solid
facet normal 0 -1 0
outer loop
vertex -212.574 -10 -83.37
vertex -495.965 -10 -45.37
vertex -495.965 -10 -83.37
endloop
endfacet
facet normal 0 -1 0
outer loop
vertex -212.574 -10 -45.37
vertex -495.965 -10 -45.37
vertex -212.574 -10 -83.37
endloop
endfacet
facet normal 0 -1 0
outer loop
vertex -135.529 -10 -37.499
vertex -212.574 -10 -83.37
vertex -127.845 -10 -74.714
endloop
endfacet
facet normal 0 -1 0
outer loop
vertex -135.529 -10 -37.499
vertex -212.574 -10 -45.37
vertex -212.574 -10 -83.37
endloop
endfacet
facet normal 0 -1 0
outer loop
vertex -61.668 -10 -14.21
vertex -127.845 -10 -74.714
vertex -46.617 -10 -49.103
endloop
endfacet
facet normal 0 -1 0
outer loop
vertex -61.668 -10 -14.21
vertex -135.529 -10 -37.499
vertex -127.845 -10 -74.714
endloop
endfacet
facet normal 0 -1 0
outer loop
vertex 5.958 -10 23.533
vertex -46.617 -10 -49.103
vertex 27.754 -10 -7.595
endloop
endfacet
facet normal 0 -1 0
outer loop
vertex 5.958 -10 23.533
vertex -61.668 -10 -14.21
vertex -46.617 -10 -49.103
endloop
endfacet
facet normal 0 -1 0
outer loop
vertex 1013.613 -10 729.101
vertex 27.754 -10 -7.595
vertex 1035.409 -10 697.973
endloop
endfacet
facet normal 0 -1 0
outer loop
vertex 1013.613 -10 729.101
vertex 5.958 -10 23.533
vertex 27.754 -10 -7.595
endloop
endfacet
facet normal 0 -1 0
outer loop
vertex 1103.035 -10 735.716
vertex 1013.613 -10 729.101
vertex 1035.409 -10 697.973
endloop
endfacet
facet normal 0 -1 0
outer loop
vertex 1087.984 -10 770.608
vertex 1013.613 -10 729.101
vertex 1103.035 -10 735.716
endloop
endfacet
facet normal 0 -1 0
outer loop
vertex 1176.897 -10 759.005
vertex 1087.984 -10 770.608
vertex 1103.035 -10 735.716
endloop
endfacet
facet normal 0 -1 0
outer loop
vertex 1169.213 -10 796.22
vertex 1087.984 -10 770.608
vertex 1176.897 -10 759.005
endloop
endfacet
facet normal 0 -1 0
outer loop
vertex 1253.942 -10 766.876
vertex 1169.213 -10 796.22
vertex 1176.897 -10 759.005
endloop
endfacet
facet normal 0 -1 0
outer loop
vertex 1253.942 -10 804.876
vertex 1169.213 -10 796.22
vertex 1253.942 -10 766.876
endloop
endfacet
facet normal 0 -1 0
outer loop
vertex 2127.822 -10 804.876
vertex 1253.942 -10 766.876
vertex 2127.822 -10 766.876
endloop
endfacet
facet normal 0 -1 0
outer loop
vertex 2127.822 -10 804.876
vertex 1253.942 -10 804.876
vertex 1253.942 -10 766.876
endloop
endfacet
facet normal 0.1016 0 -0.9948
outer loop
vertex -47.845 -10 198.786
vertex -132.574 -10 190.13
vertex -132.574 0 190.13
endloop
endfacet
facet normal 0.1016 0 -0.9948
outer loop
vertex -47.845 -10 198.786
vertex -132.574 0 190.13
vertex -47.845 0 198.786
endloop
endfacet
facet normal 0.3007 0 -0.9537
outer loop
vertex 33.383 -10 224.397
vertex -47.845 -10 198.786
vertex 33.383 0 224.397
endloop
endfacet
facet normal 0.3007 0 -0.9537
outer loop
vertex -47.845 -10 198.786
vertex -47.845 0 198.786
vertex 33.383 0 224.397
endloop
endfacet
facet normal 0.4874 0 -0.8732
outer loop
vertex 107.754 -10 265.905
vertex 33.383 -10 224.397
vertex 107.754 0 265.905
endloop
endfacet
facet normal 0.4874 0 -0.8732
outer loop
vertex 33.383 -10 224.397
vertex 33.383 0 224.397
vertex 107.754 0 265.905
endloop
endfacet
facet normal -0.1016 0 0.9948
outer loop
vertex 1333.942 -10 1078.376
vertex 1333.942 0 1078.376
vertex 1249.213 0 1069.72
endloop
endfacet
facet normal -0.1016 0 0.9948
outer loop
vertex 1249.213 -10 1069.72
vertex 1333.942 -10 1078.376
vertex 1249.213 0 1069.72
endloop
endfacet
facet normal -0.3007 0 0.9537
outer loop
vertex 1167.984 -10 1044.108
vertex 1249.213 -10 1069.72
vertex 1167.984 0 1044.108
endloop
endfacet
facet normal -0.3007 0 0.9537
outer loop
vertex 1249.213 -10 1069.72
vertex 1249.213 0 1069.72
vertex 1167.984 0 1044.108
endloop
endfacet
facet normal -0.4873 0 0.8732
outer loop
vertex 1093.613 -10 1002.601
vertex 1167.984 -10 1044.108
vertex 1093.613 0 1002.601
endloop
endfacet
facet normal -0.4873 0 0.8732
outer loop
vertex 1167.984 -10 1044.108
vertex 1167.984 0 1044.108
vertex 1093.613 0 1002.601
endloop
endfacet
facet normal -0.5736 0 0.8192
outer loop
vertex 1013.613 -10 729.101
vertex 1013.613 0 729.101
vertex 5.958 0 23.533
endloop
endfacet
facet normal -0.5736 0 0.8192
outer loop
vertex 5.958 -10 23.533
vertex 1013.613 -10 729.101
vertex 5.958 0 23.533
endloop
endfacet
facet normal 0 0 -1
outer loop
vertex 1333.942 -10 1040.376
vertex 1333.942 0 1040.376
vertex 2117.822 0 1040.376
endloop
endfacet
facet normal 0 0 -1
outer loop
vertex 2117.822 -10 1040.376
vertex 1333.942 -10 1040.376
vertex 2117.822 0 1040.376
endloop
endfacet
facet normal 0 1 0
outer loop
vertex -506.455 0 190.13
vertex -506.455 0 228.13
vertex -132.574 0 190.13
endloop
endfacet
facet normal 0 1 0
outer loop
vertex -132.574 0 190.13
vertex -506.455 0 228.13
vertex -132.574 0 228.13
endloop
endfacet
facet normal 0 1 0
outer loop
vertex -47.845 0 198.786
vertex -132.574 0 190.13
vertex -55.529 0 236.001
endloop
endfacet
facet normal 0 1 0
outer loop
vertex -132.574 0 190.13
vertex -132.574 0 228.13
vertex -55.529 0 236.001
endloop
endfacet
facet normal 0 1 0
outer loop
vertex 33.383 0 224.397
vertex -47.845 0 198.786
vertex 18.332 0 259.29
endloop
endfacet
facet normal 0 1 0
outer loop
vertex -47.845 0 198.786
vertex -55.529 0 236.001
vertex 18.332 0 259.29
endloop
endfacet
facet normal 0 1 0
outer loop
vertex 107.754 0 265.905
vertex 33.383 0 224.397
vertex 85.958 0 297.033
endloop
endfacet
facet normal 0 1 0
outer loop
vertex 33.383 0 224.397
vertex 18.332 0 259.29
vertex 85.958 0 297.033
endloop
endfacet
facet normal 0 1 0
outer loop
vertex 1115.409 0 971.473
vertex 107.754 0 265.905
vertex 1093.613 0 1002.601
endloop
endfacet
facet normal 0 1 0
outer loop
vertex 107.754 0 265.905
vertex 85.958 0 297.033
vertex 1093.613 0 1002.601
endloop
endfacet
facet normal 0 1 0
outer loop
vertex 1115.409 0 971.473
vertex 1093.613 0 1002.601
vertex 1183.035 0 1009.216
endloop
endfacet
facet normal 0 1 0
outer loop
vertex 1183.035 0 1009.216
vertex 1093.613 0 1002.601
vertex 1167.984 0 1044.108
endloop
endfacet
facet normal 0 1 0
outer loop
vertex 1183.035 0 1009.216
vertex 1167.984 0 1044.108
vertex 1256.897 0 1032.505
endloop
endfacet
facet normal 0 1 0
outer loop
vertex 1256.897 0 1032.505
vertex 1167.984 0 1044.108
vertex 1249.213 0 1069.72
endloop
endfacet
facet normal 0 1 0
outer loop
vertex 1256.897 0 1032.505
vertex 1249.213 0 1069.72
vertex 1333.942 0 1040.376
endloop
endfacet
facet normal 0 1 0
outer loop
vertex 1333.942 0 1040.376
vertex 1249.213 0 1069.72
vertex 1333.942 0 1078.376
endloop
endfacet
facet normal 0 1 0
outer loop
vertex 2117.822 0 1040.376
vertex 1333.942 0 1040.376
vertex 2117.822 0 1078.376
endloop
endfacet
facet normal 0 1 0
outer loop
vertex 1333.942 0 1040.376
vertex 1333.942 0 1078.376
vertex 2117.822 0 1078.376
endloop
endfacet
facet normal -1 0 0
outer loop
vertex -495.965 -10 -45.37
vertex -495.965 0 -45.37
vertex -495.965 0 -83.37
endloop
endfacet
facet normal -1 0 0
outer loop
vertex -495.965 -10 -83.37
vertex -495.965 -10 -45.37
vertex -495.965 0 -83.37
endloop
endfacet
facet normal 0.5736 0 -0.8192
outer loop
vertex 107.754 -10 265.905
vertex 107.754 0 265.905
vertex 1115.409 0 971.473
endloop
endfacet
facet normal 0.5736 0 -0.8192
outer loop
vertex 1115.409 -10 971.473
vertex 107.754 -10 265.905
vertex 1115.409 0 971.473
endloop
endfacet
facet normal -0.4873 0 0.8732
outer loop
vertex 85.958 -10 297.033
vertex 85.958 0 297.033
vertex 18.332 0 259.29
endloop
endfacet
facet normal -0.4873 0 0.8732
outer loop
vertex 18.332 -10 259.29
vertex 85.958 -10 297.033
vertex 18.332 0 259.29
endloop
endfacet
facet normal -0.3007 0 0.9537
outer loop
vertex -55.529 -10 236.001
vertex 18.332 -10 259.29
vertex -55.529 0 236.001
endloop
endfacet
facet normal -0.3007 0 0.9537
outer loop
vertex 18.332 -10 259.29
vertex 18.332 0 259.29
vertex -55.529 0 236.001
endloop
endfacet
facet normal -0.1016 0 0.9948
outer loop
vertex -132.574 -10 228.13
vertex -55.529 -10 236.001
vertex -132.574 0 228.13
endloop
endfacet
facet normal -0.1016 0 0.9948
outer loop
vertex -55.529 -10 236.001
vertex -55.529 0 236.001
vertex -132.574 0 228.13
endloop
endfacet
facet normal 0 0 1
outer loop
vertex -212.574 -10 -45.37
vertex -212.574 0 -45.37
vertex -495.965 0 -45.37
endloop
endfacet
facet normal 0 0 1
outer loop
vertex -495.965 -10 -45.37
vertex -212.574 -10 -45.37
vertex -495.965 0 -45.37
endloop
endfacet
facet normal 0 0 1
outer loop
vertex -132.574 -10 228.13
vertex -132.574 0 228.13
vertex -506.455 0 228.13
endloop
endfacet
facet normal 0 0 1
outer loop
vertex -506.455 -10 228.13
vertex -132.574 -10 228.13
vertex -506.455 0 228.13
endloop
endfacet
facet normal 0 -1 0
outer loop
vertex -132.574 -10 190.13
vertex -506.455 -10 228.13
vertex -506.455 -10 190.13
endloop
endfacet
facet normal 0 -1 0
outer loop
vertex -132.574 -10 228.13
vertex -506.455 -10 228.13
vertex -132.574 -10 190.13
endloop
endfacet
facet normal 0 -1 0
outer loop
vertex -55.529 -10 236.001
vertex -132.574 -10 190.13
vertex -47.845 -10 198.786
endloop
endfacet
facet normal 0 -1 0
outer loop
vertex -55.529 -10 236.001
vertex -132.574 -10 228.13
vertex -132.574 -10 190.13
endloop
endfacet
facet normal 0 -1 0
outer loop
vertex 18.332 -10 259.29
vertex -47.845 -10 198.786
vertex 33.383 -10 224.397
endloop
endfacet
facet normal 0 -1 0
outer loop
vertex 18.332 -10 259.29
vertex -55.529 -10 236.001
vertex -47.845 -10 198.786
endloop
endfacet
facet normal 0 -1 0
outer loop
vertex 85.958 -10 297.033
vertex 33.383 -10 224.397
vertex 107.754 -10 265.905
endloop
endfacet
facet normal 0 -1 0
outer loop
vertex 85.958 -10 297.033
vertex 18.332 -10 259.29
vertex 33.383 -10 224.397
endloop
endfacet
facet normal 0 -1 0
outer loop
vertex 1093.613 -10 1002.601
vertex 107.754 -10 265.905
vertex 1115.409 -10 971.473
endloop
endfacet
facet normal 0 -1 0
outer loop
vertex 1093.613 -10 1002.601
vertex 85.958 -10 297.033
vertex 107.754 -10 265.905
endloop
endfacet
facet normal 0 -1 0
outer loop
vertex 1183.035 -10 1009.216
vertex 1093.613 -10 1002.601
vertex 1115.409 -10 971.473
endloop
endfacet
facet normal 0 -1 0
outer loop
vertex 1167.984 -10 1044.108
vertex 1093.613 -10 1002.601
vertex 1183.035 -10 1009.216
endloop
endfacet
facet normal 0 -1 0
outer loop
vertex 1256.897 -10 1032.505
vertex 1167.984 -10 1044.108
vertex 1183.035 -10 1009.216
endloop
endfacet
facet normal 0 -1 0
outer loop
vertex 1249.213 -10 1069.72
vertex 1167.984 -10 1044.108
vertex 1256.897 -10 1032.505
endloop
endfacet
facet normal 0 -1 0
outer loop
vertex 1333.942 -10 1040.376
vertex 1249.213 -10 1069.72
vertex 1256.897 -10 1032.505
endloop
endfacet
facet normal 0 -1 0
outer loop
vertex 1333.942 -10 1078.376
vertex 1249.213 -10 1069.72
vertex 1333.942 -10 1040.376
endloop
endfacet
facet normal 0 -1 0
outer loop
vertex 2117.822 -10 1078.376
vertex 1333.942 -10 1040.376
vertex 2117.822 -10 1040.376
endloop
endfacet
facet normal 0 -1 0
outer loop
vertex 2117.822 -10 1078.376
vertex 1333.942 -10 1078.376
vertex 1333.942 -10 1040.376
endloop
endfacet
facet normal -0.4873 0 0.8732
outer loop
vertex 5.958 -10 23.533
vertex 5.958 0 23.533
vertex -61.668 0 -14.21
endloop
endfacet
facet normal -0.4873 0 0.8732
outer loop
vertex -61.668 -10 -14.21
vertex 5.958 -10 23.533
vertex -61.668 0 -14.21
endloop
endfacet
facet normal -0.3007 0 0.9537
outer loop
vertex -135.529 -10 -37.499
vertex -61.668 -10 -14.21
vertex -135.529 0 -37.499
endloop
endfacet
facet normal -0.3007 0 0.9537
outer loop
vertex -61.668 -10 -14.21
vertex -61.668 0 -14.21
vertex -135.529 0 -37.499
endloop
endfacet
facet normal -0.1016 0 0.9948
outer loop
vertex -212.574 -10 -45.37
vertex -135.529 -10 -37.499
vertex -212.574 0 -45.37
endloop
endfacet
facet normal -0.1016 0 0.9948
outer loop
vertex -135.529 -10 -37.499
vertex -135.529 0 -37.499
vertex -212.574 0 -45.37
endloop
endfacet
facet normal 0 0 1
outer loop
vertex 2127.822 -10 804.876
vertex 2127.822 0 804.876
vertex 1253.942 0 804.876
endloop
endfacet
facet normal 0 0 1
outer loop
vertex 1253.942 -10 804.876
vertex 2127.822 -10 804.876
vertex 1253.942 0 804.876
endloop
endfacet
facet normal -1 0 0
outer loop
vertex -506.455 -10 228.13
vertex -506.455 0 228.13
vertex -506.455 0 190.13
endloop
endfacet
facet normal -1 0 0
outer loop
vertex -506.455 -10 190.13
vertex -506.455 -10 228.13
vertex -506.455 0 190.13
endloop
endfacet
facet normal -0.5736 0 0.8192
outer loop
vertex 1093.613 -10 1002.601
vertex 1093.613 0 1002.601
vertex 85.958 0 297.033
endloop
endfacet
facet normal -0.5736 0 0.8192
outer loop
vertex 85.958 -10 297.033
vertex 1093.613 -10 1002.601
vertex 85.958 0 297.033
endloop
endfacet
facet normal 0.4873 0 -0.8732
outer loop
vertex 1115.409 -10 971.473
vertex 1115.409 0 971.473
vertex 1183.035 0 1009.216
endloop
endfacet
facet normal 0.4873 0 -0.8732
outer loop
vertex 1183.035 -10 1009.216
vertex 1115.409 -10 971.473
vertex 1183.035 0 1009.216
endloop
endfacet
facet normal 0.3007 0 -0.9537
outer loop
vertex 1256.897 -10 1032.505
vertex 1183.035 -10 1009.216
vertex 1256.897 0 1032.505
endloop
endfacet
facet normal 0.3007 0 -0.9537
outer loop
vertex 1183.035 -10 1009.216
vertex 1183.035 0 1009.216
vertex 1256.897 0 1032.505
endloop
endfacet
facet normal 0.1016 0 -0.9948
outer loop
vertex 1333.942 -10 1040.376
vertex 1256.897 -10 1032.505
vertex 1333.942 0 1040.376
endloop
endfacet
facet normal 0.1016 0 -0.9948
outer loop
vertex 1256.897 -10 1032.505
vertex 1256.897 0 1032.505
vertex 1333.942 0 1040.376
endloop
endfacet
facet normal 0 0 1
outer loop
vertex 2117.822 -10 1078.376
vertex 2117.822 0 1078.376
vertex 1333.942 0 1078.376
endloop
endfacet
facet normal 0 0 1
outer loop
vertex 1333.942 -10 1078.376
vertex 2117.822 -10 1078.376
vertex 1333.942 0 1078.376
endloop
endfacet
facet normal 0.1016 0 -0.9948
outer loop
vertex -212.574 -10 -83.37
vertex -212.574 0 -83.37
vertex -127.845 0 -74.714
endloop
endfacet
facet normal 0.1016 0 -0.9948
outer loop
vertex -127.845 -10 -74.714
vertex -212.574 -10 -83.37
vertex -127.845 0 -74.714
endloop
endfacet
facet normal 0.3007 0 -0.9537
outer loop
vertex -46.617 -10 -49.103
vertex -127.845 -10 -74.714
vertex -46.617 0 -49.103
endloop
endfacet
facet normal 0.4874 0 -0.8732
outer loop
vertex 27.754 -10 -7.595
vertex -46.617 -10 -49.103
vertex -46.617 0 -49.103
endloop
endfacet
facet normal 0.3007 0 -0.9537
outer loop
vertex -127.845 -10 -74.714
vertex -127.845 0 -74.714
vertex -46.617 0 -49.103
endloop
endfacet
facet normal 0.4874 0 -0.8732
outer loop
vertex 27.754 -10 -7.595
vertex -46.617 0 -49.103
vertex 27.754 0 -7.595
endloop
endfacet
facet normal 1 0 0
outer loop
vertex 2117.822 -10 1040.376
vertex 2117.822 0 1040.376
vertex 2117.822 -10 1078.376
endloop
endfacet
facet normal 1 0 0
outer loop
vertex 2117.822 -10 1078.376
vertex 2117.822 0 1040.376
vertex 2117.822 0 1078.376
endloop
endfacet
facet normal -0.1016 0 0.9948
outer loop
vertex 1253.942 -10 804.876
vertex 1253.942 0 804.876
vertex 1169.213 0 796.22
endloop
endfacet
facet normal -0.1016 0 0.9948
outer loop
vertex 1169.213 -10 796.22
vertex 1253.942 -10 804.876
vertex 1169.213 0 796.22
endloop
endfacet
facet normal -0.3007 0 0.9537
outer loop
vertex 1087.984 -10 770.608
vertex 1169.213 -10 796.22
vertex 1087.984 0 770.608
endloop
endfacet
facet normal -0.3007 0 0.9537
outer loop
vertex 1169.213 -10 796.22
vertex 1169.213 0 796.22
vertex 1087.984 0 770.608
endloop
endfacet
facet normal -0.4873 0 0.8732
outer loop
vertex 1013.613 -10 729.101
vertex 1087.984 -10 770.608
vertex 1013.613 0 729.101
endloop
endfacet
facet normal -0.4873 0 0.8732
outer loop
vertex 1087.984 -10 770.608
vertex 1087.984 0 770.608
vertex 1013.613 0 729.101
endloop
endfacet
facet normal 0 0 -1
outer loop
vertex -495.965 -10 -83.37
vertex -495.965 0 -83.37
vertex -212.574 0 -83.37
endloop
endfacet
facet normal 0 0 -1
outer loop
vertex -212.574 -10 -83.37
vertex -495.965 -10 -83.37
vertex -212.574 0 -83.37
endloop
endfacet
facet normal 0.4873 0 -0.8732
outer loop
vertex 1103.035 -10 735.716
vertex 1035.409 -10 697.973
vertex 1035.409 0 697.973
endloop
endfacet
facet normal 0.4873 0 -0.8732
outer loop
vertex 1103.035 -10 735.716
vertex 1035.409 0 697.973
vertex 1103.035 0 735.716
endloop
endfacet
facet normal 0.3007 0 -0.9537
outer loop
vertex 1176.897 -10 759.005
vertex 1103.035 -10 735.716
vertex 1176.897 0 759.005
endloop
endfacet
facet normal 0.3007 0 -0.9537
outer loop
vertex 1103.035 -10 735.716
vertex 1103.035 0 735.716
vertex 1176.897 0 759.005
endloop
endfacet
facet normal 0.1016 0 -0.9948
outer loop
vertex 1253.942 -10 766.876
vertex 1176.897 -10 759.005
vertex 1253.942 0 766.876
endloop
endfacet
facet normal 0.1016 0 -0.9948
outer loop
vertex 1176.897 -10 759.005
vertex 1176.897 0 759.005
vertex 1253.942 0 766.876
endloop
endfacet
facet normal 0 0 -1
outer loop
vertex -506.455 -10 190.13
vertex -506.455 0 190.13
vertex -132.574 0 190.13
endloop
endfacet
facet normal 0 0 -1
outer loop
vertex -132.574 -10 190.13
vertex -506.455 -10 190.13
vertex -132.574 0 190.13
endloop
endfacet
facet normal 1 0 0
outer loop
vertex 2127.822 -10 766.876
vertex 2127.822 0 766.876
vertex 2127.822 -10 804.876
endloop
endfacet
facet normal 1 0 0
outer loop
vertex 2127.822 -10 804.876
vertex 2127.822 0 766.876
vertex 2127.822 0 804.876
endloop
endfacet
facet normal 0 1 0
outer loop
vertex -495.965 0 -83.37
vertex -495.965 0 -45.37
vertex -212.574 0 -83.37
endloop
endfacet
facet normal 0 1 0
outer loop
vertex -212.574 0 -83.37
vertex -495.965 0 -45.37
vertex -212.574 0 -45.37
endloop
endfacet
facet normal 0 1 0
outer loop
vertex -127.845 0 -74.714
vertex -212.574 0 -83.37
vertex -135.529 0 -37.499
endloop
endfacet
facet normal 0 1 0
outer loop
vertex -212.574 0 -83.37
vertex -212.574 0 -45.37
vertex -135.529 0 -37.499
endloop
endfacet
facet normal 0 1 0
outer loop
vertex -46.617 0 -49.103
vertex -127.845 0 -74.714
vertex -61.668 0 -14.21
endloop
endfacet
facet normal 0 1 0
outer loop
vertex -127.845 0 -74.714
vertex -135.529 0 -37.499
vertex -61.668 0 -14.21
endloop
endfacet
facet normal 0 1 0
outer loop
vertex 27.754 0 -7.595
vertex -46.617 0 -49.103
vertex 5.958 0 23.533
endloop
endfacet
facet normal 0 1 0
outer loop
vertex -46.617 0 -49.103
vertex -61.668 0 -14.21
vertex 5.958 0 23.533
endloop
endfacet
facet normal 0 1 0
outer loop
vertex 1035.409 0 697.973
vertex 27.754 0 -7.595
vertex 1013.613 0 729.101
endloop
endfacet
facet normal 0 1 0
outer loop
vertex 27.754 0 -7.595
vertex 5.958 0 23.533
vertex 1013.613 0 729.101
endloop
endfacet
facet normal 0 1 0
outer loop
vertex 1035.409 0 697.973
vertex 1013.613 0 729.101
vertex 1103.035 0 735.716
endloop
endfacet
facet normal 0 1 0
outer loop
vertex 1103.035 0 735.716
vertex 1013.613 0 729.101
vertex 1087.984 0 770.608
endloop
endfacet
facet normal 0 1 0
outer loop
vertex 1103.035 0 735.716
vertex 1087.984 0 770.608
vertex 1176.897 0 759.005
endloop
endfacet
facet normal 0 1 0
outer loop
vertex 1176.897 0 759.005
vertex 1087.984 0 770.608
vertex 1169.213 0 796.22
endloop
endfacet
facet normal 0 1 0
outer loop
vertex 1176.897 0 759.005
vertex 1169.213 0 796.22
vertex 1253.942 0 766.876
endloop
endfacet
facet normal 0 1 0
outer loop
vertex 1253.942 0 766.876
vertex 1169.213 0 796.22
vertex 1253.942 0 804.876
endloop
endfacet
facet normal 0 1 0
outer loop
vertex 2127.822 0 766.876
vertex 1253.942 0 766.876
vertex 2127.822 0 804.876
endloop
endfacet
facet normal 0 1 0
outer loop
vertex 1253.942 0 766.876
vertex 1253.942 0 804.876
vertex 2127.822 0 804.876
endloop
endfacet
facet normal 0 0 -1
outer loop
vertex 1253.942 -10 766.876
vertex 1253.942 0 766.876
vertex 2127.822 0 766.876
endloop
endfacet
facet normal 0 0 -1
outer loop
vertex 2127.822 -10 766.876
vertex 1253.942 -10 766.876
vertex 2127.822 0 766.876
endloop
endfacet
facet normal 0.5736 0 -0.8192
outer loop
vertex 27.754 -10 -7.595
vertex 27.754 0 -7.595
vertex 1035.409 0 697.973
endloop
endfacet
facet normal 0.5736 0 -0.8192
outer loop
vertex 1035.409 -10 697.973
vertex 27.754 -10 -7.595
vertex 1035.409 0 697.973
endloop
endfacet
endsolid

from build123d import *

# Parameters (mm, degrees)
F1_DEPTH = 10


with BuildPart() as f1:
    # F0 (on Front) → F1 (new body)
    with BuildSketch(Plane.XZ):
        with BuildLine():
            Line((1253.941721, 766.875871), (2127.822205, 766.875871))
            Line((2127.822205, 766.875871), (2127.822205, 804.875871))
            Line((2127.822205, 804.875871), (1253.941721, 804.875871))
            ThreePointArc((1253.941721, 804.875871), (1127.945991, 785.483273), (1013.613194, 729.100577))
            Line((1013.613194, 729.100577), (5.958407, 23.5331))
            ThreePointArc((5.958407, 23.5331), (-98.005306, -27.73613), (-212.574215, -45.369971))
            Line((-212.574215, -45.369971), (-495.9647, -45.369971))
            Line((-495.9647, -45.369971), (-495.9647, -83.369971))
            Line((-495.9647, -83.369971), (-212.574215, -83.369971))
            ThreePointArc((-212.574215, -83.369971), (-86.578485, -63.977374), (27.754312, -7.594678))
            Line((27.754312, -7.594678), (1035.409098, 697.9728))
            ThreePointArc((1035.409098, 697.9728), (1139.372811, 749.242029), (1253.941721, 766.875871))
        make_face()
        with BuildLine():
            Line((1333.941721, 1040.375871), (2117.822205, 1040.375871))
            Line((2117.822205, 1040.375871), (2117.822205, 1078.375871))
            Line((2117.822205, 1078.375871), (1333.941721, 1078.375871))
            ThreePointArc((1333.941721, 1078.375871), (1207.945991, 1058.983273), (1093.613194, 1002.600577))
            Line((1093.613194, 1002.600577), (85.958407, 297.0331))
            ThreePointArc((85.958407, 297.0331), (-18.005306, 245.76387), (-132.574215, 228.130029))
            Line((-132.574215, 228.130029), (-506.4547, 228.130029))
            Line((-506.4547, 228.130029), (-506.4547, 190.130029))
            Line((-506.4547, 190.130029), (-132.574215, 190.130029))
            ThreePointArc((-132.574215, 190.130029), (-6.578485, 209.522626), (107.754312, 265.905322))
            Line((107.754312, 265.905322), (1115.409098, 971.4728))
            ThreePointArc((1115.409098, 971.4728), (1219.372811, 1022.742029), (1333.941721, 1040.375871))
        make_face()
    extrude(amount=F1_DEPTH)


solid = f1.part
